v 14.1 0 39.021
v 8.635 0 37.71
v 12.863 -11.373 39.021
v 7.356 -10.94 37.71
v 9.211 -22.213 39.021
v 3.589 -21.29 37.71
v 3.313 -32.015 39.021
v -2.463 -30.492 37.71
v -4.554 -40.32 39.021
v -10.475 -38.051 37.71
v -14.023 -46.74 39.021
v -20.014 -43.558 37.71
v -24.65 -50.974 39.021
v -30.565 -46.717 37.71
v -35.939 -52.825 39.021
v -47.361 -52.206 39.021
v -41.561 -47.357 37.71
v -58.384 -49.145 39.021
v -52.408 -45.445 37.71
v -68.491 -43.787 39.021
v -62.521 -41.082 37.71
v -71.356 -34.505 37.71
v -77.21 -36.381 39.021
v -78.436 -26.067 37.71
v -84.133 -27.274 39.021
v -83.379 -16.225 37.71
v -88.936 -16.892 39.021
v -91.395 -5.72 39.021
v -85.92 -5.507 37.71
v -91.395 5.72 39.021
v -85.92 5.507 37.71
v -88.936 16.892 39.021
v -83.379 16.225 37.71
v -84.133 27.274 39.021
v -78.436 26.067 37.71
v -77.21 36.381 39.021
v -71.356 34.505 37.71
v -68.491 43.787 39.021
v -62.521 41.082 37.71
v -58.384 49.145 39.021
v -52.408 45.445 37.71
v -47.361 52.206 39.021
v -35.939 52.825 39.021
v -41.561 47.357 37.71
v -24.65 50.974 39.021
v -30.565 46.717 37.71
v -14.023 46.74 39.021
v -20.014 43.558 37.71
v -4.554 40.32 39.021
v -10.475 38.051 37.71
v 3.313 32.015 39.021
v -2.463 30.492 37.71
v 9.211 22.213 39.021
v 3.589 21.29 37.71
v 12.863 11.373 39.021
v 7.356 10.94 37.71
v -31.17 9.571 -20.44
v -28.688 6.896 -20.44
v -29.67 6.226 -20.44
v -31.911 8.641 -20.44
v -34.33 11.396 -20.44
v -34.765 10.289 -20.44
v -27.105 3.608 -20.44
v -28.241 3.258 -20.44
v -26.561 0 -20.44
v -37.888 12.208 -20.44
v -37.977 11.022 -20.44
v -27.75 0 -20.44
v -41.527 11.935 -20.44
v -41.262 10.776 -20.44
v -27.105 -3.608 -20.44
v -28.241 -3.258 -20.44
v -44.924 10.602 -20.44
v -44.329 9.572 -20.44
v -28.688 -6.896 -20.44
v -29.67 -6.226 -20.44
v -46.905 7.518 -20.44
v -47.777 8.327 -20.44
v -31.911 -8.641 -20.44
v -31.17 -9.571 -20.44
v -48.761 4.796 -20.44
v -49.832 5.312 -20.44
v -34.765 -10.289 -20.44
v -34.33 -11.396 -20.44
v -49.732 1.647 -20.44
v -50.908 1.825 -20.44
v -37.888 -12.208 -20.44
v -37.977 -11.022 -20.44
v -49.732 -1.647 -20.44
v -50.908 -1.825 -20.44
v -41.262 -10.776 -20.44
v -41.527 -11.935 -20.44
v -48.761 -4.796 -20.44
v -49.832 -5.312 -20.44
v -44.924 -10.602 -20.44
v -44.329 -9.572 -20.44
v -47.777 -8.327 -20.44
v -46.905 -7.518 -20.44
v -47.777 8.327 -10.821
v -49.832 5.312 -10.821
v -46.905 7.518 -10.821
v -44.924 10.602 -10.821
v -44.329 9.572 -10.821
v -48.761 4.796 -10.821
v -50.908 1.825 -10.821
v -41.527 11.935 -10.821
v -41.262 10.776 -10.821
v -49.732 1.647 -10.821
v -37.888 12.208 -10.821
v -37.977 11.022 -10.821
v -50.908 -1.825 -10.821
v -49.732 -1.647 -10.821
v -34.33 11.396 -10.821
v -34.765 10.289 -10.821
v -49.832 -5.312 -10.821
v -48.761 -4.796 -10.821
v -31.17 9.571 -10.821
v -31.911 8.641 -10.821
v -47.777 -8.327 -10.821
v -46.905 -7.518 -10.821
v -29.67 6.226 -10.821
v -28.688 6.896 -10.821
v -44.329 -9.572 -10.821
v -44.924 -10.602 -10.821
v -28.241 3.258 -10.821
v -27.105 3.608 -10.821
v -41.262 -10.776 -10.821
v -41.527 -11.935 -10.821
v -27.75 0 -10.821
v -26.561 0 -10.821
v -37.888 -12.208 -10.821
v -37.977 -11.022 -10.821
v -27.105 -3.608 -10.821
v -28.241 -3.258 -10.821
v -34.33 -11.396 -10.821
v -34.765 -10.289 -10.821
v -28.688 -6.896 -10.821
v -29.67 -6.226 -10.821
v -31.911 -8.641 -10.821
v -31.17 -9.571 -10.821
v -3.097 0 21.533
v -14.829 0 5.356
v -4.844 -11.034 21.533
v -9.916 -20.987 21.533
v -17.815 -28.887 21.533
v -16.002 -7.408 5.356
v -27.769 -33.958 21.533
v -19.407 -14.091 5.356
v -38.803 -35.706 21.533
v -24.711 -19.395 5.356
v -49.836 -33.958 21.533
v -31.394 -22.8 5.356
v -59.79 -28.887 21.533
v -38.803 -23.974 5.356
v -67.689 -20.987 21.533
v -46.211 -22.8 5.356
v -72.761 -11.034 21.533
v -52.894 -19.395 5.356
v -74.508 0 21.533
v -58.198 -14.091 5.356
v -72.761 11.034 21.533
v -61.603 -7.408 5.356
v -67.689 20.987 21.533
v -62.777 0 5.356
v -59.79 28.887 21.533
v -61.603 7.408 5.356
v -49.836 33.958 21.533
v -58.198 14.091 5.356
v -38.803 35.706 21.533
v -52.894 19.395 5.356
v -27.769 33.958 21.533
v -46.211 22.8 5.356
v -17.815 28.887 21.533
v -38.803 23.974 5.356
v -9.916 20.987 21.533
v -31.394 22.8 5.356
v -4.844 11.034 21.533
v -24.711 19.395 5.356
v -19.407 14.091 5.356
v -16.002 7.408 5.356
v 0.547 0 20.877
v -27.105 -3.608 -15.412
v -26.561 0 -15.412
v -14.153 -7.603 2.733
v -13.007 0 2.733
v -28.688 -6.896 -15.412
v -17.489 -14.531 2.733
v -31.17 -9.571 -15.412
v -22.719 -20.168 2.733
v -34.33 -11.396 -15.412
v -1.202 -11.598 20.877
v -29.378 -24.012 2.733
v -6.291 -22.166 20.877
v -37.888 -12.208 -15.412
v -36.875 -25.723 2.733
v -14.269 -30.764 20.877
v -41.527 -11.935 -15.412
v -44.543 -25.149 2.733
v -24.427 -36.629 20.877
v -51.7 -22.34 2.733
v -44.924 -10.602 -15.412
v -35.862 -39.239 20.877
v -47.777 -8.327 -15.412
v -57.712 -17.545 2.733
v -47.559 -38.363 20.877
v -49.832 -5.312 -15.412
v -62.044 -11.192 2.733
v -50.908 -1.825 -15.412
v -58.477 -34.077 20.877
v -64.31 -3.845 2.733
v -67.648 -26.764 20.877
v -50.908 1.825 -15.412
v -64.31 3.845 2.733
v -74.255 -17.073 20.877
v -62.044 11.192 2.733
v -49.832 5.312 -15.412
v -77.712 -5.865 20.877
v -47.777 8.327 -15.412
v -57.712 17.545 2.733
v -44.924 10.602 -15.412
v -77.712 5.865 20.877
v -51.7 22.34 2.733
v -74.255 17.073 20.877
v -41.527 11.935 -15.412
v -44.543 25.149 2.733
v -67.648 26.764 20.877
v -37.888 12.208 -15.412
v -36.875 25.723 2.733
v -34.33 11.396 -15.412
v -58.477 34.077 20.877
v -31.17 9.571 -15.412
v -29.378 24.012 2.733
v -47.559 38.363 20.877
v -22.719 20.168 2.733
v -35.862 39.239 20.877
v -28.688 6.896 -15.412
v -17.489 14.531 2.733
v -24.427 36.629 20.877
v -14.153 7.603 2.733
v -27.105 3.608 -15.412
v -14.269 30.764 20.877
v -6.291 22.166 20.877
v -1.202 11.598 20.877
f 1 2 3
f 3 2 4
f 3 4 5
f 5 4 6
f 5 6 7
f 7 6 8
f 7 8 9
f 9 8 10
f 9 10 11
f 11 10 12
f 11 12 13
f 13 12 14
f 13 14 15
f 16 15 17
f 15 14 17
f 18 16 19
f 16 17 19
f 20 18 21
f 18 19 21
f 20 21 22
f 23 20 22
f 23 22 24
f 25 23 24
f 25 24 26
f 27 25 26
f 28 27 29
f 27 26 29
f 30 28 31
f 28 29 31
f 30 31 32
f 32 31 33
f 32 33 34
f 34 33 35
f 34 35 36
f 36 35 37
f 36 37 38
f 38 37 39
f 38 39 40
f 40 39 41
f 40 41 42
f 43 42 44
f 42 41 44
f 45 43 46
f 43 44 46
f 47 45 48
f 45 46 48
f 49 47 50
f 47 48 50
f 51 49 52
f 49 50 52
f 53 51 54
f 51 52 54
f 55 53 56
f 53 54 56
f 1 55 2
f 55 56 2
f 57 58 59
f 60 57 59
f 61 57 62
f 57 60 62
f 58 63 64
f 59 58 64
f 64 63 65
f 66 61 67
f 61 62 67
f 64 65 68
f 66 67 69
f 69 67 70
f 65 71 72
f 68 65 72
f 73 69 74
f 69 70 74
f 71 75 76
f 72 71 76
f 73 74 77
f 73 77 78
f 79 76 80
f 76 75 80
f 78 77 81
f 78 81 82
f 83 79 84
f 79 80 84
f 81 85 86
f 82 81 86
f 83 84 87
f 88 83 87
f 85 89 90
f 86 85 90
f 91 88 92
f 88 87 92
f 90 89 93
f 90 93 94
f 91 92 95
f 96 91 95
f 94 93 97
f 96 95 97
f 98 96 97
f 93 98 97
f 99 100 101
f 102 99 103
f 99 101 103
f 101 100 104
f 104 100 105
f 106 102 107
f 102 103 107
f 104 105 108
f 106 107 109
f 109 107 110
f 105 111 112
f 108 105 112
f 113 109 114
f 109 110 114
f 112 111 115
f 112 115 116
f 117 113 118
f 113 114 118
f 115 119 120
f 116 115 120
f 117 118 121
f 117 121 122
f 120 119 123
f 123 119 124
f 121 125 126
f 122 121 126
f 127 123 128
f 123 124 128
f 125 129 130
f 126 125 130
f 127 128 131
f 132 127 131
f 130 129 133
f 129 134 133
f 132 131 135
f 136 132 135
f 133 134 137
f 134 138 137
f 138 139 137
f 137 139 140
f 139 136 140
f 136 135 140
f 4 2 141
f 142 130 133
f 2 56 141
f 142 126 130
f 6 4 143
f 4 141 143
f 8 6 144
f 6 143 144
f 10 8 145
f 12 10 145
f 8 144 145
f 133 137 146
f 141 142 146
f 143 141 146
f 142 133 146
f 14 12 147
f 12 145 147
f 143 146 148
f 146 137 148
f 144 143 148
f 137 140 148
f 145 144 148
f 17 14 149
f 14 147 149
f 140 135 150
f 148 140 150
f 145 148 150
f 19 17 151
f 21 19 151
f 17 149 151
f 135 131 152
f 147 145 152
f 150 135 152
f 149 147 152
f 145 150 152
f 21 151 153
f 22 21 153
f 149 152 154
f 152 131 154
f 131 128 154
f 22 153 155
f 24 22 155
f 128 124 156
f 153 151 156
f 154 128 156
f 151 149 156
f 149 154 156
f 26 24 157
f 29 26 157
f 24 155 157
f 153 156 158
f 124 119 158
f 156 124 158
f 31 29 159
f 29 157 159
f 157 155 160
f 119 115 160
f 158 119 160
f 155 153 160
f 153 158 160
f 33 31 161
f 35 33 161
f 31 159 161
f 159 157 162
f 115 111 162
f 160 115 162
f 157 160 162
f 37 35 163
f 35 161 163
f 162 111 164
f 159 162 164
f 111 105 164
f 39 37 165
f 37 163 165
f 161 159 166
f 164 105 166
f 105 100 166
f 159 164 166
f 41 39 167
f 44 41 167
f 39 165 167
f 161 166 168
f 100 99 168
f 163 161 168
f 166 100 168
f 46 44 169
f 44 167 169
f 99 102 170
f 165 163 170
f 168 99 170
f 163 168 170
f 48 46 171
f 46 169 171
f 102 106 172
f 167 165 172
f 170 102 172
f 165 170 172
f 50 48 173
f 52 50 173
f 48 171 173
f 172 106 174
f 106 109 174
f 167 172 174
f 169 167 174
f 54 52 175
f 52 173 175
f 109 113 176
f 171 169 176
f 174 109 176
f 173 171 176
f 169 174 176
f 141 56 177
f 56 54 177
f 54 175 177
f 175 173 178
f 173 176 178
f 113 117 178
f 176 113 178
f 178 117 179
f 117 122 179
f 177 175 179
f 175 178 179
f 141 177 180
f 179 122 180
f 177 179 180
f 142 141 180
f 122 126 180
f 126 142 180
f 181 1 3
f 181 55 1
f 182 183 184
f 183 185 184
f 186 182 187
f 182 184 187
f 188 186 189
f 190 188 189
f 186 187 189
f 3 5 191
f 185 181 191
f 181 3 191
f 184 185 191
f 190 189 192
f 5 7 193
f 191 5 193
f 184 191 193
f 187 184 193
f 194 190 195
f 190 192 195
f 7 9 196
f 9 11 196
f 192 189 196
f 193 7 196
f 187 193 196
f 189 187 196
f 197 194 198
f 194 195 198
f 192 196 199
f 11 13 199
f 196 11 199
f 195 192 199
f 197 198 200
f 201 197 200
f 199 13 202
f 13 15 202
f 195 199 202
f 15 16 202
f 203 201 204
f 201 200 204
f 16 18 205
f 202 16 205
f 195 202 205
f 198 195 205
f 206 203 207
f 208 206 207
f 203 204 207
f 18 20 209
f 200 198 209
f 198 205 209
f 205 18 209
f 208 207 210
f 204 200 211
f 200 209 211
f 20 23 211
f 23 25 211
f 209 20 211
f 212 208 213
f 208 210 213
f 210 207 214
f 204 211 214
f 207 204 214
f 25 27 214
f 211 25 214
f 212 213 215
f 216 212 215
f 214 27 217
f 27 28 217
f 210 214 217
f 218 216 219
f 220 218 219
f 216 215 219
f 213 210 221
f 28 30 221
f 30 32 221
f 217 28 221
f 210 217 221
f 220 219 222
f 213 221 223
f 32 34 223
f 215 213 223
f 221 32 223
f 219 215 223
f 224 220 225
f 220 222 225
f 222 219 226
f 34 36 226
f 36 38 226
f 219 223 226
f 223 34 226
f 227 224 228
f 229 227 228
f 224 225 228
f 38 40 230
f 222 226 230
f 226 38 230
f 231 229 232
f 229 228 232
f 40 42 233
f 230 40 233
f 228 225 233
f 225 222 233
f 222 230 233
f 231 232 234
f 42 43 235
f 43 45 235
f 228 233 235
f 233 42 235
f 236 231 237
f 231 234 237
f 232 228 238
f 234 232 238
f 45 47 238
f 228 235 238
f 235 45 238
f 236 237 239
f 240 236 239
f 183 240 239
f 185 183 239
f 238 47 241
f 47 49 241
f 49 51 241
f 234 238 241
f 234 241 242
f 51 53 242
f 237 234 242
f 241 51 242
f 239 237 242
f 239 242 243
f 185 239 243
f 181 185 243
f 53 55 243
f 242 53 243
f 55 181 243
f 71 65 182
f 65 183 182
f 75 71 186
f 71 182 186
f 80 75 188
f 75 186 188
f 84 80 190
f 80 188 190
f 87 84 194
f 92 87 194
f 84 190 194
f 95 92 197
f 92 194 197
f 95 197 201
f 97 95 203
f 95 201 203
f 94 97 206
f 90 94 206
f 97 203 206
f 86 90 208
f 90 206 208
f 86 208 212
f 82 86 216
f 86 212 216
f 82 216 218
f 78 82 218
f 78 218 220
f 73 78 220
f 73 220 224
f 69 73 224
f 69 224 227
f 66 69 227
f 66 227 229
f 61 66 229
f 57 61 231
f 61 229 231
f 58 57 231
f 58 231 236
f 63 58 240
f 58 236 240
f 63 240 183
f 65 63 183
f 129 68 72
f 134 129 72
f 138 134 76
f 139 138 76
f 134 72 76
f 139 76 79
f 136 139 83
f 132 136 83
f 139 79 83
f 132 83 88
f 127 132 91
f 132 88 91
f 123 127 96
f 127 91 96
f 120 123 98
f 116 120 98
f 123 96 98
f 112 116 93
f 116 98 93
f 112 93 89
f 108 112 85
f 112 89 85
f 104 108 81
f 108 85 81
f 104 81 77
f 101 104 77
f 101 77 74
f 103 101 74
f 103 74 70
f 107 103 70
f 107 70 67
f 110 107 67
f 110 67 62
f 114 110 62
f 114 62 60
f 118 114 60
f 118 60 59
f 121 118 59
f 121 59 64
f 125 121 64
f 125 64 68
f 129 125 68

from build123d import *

# Parameters (mm, degrees)
F2_R     = 11.052767
F3_DEPTH = 25.4


with BuildPart() as f1:
    # F0 (on Front) → F1 (revolve)
    with BuildSketch(Plane.XZ):
        Polygon((14.100123, 39.021272), (8.634958, 37.709631), (-26.560698, -10.821025), (-38.802665, -10.821025), (-38.802665, -20.439714), (-26.560698, -20.439714), (-26.560698, -15.411762), align=None)
    revolve(axis=Axis((-38.802665, 0, -15.63037), (0, 0, -1)))

    # F2 (on face) → F3 (cut)
    with BuildSketch(Plane(origin=(0, 0, -20.439714), x_dir=(1, 0, 0), z_dir=(0, 0, -1))):
        with Locations((-38.802665, 0)):
            Circle(F2_R)
    extrude(amount=-F3_DEPTH, mode=Mode.SUBTRACT)


solid = f1.part
